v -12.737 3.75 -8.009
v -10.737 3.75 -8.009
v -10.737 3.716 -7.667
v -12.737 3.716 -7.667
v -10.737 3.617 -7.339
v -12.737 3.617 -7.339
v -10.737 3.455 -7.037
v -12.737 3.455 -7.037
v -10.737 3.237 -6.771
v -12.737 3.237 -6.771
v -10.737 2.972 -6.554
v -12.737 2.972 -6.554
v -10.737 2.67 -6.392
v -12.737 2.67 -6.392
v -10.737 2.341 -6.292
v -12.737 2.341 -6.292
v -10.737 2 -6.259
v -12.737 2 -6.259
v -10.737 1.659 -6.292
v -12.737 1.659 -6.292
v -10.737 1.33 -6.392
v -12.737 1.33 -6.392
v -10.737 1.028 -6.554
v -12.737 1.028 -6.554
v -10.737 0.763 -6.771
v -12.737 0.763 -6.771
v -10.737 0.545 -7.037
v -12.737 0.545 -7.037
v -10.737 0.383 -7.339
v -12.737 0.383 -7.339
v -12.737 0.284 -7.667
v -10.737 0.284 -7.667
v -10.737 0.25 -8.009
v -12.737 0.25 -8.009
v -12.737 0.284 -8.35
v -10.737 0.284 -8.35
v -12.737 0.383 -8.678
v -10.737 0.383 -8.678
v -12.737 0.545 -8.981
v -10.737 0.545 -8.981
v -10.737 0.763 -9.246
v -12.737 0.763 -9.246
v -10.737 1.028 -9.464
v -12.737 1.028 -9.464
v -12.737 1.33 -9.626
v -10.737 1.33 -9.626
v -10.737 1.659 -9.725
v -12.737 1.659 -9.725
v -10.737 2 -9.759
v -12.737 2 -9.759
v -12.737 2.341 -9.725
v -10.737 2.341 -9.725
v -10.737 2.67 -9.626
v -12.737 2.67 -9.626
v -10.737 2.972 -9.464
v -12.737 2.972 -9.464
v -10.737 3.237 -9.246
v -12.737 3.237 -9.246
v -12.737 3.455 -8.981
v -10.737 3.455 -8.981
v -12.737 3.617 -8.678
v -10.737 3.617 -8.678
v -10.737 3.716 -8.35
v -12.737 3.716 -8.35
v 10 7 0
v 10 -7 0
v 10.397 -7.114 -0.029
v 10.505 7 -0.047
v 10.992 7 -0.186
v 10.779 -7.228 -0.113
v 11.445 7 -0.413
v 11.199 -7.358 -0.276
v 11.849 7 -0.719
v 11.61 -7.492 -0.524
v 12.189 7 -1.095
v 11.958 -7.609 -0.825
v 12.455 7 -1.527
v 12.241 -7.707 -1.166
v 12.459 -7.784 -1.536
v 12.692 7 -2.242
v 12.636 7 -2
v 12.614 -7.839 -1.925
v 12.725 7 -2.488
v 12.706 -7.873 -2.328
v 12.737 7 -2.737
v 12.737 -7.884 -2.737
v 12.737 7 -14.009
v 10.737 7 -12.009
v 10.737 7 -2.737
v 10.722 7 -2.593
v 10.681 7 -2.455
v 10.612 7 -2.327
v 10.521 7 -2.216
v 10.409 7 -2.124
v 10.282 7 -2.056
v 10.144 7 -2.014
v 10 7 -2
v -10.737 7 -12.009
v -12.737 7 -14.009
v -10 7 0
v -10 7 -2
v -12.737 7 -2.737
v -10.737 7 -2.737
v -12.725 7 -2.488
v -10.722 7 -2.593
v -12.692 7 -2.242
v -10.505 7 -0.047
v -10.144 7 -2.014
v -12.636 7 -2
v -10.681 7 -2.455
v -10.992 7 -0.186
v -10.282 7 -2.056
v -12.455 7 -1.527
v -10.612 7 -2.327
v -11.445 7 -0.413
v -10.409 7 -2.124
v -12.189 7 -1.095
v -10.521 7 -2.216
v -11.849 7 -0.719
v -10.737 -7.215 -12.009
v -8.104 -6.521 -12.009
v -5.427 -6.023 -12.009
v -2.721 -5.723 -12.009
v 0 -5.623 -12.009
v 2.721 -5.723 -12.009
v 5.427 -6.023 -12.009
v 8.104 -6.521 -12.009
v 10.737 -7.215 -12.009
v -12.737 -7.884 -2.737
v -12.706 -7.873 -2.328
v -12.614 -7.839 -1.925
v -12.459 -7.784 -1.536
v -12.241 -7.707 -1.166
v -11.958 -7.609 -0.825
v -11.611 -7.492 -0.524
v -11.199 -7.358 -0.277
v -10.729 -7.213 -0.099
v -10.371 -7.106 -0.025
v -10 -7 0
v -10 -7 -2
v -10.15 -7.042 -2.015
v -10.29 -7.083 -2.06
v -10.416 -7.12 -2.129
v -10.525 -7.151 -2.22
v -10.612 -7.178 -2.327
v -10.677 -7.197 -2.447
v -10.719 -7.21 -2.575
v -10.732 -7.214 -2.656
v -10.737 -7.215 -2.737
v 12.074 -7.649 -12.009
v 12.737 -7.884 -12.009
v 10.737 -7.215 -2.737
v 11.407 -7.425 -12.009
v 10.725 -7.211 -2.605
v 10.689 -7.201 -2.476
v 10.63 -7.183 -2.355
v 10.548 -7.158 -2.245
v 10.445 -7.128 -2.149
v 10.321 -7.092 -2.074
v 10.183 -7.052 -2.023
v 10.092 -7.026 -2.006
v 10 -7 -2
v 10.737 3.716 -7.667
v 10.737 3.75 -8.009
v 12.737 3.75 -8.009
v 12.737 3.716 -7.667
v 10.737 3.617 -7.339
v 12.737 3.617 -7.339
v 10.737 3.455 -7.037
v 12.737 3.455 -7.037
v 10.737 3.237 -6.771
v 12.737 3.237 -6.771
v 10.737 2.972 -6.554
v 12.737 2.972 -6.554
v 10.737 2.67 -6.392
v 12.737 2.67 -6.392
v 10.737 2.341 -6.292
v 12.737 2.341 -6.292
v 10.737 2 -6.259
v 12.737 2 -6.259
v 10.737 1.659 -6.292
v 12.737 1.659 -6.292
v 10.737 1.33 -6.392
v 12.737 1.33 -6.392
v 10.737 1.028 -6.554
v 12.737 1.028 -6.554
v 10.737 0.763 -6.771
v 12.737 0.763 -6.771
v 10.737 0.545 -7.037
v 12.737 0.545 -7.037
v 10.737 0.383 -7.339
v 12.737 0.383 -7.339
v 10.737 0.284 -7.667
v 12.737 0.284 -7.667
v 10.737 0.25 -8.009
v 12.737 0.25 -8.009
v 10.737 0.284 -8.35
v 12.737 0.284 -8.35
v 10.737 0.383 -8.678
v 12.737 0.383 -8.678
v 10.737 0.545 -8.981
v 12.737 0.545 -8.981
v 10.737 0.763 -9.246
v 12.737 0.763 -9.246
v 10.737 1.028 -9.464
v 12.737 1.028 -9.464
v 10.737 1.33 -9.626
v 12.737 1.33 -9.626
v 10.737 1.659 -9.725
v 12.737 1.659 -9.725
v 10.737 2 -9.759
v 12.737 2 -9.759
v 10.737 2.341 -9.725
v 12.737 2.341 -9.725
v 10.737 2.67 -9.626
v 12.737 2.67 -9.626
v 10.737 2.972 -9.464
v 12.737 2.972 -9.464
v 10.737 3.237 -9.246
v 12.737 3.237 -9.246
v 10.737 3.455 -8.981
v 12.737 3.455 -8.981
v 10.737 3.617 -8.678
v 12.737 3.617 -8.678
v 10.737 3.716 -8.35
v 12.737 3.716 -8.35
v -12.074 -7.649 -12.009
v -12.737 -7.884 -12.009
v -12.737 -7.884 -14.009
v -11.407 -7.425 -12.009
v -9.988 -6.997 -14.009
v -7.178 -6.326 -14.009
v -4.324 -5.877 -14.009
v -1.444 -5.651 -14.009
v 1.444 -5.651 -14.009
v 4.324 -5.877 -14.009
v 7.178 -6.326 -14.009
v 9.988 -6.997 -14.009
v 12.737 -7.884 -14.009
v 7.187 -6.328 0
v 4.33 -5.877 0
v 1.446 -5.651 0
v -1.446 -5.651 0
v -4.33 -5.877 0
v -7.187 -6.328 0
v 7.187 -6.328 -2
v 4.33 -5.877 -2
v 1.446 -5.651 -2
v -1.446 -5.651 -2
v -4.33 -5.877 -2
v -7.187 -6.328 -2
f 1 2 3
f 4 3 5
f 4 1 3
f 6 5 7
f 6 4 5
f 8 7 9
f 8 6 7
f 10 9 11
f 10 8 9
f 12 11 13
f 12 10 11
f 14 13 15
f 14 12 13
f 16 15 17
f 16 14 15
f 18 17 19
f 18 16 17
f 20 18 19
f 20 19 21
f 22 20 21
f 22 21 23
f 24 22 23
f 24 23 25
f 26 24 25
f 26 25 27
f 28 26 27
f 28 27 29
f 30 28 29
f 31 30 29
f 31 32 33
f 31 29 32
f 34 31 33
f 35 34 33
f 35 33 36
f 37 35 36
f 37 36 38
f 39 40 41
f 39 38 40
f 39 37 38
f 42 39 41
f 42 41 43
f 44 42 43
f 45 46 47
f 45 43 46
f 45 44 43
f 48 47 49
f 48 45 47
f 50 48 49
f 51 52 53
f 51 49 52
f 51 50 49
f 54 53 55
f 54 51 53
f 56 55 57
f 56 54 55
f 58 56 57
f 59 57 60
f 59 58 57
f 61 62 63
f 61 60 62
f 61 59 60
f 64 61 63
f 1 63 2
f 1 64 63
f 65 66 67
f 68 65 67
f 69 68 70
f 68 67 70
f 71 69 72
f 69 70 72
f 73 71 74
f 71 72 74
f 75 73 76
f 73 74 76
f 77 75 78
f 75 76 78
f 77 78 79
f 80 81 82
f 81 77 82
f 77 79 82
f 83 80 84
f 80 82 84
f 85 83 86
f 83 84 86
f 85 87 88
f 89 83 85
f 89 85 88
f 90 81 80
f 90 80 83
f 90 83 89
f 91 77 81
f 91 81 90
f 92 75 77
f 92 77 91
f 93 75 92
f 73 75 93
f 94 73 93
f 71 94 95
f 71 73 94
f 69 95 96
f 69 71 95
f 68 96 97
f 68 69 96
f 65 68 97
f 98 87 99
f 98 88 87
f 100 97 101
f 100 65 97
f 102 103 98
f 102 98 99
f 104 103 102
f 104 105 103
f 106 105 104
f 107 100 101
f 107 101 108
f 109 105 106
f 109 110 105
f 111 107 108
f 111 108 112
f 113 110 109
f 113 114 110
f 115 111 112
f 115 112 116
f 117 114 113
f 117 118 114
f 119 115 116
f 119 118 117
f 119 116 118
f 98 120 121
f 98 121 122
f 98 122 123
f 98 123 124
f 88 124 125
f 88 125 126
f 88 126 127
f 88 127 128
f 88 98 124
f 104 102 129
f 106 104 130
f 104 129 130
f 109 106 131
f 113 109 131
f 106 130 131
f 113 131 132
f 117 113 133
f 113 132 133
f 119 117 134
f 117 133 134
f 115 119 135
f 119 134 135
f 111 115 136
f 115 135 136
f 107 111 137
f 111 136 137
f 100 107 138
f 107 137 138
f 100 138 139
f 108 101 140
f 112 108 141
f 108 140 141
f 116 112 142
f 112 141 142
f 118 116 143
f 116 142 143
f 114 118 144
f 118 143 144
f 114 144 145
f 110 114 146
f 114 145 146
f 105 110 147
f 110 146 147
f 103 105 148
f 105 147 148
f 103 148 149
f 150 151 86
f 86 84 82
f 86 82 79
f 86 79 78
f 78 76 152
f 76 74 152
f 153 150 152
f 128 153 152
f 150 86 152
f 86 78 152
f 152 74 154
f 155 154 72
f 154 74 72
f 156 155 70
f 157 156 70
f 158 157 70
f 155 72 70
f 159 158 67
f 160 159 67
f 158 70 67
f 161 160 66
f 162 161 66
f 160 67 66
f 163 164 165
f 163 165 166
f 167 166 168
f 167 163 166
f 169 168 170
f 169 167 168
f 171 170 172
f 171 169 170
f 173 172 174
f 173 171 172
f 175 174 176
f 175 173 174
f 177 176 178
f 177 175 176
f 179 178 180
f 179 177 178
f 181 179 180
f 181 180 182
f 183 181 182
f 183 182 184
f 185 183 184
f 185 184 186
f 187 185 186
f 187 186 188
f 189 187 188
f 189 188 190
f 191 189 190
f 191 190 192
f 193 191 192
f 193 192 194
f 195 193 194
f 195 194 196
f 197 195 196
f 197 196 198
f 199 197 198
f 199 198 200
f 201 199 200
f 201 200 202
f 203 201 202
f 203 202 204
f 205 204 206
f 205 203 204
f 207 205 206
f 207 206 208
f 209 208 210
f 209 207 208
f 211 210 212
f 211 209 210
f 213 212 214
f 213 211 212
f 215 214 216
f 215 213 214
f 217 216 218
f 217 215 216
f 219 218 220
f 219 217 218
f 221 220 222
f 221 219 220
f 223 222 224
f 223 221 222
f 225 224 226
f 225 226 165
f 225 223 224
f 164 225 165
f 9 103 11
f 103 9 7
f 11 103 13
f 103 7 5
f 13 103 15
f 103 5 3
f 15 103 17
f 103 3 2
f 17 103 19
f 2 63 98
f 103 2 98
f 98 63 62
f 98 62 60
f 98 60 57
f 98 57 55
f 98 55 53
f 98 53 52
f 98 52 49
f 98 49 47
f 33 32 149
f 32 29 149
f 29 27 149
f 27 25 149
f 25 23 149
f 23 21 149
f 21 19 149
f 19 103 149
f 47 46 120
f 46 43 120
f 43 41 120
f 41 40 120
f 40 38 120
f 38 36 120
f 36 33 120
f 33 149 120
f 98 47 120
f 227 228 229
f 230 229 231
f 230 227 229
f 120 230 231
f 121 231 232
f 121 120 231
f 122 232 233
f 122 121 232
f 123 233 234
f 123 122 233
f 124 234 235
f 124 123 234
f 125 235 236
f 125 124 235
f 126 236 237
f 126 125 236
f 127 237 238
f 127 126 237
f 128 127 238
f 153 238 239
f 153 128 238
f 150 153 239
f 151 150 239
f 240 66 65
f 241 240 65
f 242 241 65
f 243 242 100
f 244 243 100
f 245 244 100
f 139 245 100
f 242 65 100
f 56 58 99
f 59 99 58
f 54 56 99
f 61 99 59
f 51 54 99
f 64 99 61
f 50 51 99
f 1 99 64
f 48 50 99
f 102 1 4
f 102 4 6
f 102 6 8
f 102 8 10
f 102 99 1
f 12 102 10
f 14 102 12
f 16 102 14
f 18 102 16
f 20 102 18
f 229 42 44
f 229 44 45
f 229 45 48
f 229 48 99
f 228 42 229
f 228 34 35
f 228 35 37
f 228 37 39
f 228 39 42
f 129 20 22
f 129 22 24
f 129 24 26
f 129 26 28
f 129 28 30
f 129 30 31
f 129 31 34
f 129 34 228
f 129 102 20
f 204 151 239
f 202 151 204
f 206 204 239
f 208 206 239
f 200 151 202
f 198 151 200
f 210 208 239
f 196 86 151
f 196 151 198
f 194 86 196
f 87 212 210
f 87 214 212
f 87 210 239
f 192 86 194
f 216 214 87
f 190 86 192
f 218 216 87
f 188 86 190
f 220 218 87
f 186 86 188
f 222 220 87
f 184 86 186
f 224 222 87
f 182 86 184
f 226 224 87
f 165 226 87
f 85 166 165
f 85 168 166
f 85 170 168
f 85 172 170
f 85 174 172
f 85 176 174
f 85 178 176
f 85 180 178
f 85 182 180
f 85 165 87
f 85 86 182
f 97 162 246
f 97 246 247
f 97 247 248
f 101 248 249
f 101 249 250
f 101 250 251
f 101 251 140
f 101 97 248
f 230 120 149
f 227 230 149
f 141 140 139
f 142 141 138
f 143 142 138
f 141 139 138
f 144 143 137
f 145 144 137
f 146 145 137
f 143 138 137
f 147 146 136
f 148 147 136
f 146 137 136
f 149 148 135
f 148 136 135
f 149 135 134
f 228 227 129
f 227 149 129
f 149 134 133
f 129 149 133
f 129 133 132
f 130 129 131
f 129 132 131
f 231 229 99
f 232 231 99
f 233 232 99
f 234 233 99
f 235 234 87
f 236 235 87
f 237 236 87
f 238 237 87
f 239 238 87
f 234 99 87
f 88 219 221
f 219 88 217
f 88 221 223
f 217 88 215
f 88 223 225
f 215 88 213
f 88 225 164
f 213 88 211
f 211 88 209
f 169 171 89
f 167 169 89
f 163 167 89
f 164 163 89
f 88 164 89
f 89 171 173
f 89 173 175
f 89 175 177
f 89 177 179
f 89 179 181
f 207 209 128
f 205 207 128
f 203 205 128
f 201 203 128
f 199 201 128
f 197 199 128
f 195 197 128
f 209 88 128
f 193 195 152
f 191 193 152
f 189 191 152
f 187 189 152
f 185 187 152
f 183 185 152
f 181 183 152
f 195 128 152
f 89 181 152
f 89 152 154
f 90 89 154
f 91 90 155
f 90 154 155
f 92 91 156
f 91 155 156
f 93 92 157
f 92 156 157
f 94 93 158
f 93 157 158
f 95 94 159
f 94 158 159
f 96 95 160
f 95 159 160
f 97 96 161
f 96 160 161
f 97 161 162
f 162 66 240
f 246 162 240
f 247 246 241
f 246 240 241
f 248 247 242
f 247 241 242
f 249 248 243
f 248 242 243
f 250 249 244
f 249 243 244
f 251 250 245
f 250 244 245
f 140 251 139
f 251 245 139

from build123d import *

# Parameters (mm, degrees)
SKETCH1_R                  = 1.75
BASE_FLANGE1_DEPTH         = 2
SKETCHED_START             = -8.2
SKETCHED_BEND1_DEPTH       = 15.2
SKETCHED_BEND1_2_DEPTH     = 8.4499999
SKETCHED_START_2           = 3.7500001
SKETCHED_BEND1_3_DEPTH     = 3.2499999
SKETCHED_START_3           = 0.2499999
SKETCHED_BEND1_4_DEPTH     = 3.5000002
SKETCHED_START_4           = -12.7366
SKETCHED_BEND1_5_OUTLINE_R = 1.75
SKETCHED_BEND1_5_DEPTH     = 25.4732
SKETCH7_R                  = 37
CUT_EXTRUDE1_DEPTH         = 20.330576261
BOSS_EXTRUDE1_DEPTH        = 2


with BuildPart() as part:
    # Base-Flange1: sheet metal written as solids
    # Sketch1 → Base-Flange1 (new body)
    with BuildSketch(Plane.XY):
        with BuildLine():
            Line((10, 7), (22, 7))
            Line((22, 7), (22, -8.2))
            Line((22, -8.2), (10, -8.2))
            Line((10, -8.2), (10, -7))
            ThreePointArc((10, -7), (0, -5.623026261), (-10, -7))
            Line((-10, -7), (-10, -8.2))
            Line((-10, -8.2), (-22, -8.2))
            Line((-22, -8.2), (-22, 7))
            Line((-22, 7), (-10, 7))
            Line((-10, 7), (10, 7))
        make_face()
        with Locations((18, 2)):
            Circle(SKETCH1_R, mode=Mode.SUBTRACT)
        with Locations(Location((-18, 2, 0), (0, 0, 180))):
            Circle(SKETCH1_R, mode=Mode.SUBTRACT)
    extrude(amount=-BASE_FLANGE1_DEPTH)

    # Sketched Bend1: read off the stored shape, not the designer's step
    # Sketched Bend1 outline → Sketched Bend1 (cut)
    with BuildSketch(Plane(origin=(0, 0, 0), x_dir=(1, 0, 0), z_dir=(0, 1, 0)).offset(SKETCHED_START)):
        with BuildLine():
            ThreePointArc((-10, 0), (-11.654267209, 0.556604688), (-12.635602398, 2))
            Line((-12.635602398, 2), (-22, 2))
            Line((-22, 2), (-22, 0))
            Line((-22, 0), (-10, 0))
        make_face()
        with BuildLine():
            Line((22, 2), (12.635602398, 2))
            ThreePointArc((12.635602398, 2), (11.654267209, 0.556604688), (10, 0))
            Line((10, 0), (22, 0))
            Line((22, 0), (22, 2))
        make_face()
    extrude(amount=SKETCHED_BEND1_DEPTH, mode=Mode.SUBTRACT)

    # Sketched Bend1 2 outline → Sketched Bend1 2 (add)
    with BuildSketch(Plane(origin=(0, 0, 0), x_dir=(1, 0, 0), z_dir=(0, 1, 0)).offset(SKETCHED_START)):
        with BuildLine():
            ThreePointArc((-10, 2), (-10.520854855, 2.215745145), (-10.7366, 2.7366))
            Line((-10.7366, 2.7366), (-10.7366, 12.008755099))
            Line((-10.7366, 12.008755099), (-12.7366, 12.008755099))
            Line((-12.7366, 12.008755099), (-12.7366, 2.7366))
            ThreePointArc((-12.7366, 2.7366), (-12.711233029, 2.364854094), (-12.635602398, 2))
            Line((-12.635602398, 2), (-10, 2))
        make_face()
        with BuildLine():
            ThreePointArc((10.7366, 2.7366), (10.520854855, 2.215745145), (10, 2))
            Line((10, 2), (12.635602398, 2))
            ThreePointArc((12.635602398, 2), (12.711233029, 2.364854094), (12.7366, 2.7366))
            Line((12.7366, 2.7366), (12.7366, 12.008755099))
            Line((12.7366, 12.008755099), (10.7366, 12.008755099))
            Line((10.7366, 12.008755099), (10.7366, 2.7366))
        make_face()
    extrude(amount=SKETCHED_BEND1_2_DEPTH)

    # Sketched Bend1 3 outline → Sketched Bend1 3 (add)
    with BuildSketch(Plane(origin=(0, 0, 0), x_dir=(1, 0, 0), z_dir=(0, 1, 0)).offset(SKETCHED_START_2)):
        with BuildLine():
            ThreePointArc((-10, 2), (-10.520854855, 2.215745145), (-10.7366, 2.7366))
            Line((-10.7366, 2.7366), (-10.7366, 12.008755099))
            Line((-10.7366, 12.008755099), (-12.7366, 12.008755099))
            Line((-12.7366, 12.008755099), (-12.7366, 2.7366))
            ThreePointArc((-12.7366, 2.7366), (-12.711233029, 2.364854094), (-12.635602398, 2))
            Line((-12.635602398, 2), (-10, 2))
        make_face()
        with BuildLine():
            ThreePointArc((10.7366, 2.7366), (10.520854855, 2.215745145), (10, 2))
            Line((10, 2), (12.635602398, 2))
            ThreePointArc((12.635602398, 2), (12.711233029, 2.364854094), (12.7366, 2.7366))
            Line((12.7366, 2.7366), (12.7366, 12.008755099))
            Line((12.7366, 12.008755099), (10.7366, 12.008755099))
            Line((10.7366, 12.008755099), (10.7366, 2.7366))
        make_face()
    extrude(amount=SKETCHED_BEND1_3_DEPTH)

    # Sketched Bend1 4 outline → Sketched Bend1 4 (add)
    with BuildSketch(Plane(origin=(0, 0, 0), x_dir=(1, 0, 0), z_dir=(0, 1, 0)).offset(SKETCHED_START_3)):
        with BuildLine():
            ThreePointArc((10.7366, 2.7366), (10.520854855, 2.215745145), (10, 2))
            Line((10, 2), (12.635602398, 2))
            ThreePointArc((12.635602398, 2), (12.711233029, 2.364854094), (12.7366, 2.7366))
            Line((12.7366, 2.7366), (12.7366, 12.008755099))
            Line((12.7366, 12.008755099), (10.7366, 12.008755099))
            Line((10.7366, 12.008755099), (10.7366, 2.7366))
        make_face()
        with BuildLine():
            ThreePointArc((-10, 2), (-10.520854855, 2.215745145), (-10.7366, 2.7366))
            Line((-10.7366, 2.7366), (-10.7366, 12.008755099))
            Line((-10.7366, 12.008755099), (-12.7366, 12.008755099))
            Line((-12.7366, 12.008755099), (-12.7366, 2.7366))
            ThreePointArc((-12.7366, 2.7366), (-12.711233029, 2.364854094), (-12.635602398, 2))
            Line((-12.635602398, 2), (-10, 2))
        make_face()
    extrude(amount=SKETCHED_BEND1_4_DEPTH)

    # Sketched Bend1 5 outline → Sketched Bend1 5 (cut)
    with BuildSketch(Plane.YZ.offset(SKETCHED_START_4)):
        with Locations((2, -8.008755099)):
            Circle(SKETCHED_BEND1_5_OUTLINE_R)
    extrude(amount=SKETCHED_BEND1_5_DEPTH, mode=Mode.SUBTRACT)

    # Sketch7 → Cut-Extrude1 (cut, through all)
    with BuildSketch(Plane.XY):
        with Locations((0, -42.623026261)):
            Circle(SKETCH7_R)
    extrude(amount=-CUT_EXTRUDE1_DEPTH, mode=Mode.SUBTRACT)

    # Sketch8 → Boss-Extrude1 (add)
    with BuildSketch(Plane(origin=(0, 0, -12.008755099), x_dir=(-1, 0, 0), z_dir=(0, 0, -1))):
        with BuildLine():
            Line((-12.7366, -7.884301177), (-12.7366, 7))
            Line((-12.7366, 7), (12.7366, 7))
            Line((12.7366, 7), (12.7366, -7.884301177))
            ThreePointArc((12.7366, -7.884301177), (0, -5.623026261), (-12.7366, -7.884301177))
        make_face()
    extrude(amount=BOSS_EXTRUDE1_DEPTH)


solid = part.part
